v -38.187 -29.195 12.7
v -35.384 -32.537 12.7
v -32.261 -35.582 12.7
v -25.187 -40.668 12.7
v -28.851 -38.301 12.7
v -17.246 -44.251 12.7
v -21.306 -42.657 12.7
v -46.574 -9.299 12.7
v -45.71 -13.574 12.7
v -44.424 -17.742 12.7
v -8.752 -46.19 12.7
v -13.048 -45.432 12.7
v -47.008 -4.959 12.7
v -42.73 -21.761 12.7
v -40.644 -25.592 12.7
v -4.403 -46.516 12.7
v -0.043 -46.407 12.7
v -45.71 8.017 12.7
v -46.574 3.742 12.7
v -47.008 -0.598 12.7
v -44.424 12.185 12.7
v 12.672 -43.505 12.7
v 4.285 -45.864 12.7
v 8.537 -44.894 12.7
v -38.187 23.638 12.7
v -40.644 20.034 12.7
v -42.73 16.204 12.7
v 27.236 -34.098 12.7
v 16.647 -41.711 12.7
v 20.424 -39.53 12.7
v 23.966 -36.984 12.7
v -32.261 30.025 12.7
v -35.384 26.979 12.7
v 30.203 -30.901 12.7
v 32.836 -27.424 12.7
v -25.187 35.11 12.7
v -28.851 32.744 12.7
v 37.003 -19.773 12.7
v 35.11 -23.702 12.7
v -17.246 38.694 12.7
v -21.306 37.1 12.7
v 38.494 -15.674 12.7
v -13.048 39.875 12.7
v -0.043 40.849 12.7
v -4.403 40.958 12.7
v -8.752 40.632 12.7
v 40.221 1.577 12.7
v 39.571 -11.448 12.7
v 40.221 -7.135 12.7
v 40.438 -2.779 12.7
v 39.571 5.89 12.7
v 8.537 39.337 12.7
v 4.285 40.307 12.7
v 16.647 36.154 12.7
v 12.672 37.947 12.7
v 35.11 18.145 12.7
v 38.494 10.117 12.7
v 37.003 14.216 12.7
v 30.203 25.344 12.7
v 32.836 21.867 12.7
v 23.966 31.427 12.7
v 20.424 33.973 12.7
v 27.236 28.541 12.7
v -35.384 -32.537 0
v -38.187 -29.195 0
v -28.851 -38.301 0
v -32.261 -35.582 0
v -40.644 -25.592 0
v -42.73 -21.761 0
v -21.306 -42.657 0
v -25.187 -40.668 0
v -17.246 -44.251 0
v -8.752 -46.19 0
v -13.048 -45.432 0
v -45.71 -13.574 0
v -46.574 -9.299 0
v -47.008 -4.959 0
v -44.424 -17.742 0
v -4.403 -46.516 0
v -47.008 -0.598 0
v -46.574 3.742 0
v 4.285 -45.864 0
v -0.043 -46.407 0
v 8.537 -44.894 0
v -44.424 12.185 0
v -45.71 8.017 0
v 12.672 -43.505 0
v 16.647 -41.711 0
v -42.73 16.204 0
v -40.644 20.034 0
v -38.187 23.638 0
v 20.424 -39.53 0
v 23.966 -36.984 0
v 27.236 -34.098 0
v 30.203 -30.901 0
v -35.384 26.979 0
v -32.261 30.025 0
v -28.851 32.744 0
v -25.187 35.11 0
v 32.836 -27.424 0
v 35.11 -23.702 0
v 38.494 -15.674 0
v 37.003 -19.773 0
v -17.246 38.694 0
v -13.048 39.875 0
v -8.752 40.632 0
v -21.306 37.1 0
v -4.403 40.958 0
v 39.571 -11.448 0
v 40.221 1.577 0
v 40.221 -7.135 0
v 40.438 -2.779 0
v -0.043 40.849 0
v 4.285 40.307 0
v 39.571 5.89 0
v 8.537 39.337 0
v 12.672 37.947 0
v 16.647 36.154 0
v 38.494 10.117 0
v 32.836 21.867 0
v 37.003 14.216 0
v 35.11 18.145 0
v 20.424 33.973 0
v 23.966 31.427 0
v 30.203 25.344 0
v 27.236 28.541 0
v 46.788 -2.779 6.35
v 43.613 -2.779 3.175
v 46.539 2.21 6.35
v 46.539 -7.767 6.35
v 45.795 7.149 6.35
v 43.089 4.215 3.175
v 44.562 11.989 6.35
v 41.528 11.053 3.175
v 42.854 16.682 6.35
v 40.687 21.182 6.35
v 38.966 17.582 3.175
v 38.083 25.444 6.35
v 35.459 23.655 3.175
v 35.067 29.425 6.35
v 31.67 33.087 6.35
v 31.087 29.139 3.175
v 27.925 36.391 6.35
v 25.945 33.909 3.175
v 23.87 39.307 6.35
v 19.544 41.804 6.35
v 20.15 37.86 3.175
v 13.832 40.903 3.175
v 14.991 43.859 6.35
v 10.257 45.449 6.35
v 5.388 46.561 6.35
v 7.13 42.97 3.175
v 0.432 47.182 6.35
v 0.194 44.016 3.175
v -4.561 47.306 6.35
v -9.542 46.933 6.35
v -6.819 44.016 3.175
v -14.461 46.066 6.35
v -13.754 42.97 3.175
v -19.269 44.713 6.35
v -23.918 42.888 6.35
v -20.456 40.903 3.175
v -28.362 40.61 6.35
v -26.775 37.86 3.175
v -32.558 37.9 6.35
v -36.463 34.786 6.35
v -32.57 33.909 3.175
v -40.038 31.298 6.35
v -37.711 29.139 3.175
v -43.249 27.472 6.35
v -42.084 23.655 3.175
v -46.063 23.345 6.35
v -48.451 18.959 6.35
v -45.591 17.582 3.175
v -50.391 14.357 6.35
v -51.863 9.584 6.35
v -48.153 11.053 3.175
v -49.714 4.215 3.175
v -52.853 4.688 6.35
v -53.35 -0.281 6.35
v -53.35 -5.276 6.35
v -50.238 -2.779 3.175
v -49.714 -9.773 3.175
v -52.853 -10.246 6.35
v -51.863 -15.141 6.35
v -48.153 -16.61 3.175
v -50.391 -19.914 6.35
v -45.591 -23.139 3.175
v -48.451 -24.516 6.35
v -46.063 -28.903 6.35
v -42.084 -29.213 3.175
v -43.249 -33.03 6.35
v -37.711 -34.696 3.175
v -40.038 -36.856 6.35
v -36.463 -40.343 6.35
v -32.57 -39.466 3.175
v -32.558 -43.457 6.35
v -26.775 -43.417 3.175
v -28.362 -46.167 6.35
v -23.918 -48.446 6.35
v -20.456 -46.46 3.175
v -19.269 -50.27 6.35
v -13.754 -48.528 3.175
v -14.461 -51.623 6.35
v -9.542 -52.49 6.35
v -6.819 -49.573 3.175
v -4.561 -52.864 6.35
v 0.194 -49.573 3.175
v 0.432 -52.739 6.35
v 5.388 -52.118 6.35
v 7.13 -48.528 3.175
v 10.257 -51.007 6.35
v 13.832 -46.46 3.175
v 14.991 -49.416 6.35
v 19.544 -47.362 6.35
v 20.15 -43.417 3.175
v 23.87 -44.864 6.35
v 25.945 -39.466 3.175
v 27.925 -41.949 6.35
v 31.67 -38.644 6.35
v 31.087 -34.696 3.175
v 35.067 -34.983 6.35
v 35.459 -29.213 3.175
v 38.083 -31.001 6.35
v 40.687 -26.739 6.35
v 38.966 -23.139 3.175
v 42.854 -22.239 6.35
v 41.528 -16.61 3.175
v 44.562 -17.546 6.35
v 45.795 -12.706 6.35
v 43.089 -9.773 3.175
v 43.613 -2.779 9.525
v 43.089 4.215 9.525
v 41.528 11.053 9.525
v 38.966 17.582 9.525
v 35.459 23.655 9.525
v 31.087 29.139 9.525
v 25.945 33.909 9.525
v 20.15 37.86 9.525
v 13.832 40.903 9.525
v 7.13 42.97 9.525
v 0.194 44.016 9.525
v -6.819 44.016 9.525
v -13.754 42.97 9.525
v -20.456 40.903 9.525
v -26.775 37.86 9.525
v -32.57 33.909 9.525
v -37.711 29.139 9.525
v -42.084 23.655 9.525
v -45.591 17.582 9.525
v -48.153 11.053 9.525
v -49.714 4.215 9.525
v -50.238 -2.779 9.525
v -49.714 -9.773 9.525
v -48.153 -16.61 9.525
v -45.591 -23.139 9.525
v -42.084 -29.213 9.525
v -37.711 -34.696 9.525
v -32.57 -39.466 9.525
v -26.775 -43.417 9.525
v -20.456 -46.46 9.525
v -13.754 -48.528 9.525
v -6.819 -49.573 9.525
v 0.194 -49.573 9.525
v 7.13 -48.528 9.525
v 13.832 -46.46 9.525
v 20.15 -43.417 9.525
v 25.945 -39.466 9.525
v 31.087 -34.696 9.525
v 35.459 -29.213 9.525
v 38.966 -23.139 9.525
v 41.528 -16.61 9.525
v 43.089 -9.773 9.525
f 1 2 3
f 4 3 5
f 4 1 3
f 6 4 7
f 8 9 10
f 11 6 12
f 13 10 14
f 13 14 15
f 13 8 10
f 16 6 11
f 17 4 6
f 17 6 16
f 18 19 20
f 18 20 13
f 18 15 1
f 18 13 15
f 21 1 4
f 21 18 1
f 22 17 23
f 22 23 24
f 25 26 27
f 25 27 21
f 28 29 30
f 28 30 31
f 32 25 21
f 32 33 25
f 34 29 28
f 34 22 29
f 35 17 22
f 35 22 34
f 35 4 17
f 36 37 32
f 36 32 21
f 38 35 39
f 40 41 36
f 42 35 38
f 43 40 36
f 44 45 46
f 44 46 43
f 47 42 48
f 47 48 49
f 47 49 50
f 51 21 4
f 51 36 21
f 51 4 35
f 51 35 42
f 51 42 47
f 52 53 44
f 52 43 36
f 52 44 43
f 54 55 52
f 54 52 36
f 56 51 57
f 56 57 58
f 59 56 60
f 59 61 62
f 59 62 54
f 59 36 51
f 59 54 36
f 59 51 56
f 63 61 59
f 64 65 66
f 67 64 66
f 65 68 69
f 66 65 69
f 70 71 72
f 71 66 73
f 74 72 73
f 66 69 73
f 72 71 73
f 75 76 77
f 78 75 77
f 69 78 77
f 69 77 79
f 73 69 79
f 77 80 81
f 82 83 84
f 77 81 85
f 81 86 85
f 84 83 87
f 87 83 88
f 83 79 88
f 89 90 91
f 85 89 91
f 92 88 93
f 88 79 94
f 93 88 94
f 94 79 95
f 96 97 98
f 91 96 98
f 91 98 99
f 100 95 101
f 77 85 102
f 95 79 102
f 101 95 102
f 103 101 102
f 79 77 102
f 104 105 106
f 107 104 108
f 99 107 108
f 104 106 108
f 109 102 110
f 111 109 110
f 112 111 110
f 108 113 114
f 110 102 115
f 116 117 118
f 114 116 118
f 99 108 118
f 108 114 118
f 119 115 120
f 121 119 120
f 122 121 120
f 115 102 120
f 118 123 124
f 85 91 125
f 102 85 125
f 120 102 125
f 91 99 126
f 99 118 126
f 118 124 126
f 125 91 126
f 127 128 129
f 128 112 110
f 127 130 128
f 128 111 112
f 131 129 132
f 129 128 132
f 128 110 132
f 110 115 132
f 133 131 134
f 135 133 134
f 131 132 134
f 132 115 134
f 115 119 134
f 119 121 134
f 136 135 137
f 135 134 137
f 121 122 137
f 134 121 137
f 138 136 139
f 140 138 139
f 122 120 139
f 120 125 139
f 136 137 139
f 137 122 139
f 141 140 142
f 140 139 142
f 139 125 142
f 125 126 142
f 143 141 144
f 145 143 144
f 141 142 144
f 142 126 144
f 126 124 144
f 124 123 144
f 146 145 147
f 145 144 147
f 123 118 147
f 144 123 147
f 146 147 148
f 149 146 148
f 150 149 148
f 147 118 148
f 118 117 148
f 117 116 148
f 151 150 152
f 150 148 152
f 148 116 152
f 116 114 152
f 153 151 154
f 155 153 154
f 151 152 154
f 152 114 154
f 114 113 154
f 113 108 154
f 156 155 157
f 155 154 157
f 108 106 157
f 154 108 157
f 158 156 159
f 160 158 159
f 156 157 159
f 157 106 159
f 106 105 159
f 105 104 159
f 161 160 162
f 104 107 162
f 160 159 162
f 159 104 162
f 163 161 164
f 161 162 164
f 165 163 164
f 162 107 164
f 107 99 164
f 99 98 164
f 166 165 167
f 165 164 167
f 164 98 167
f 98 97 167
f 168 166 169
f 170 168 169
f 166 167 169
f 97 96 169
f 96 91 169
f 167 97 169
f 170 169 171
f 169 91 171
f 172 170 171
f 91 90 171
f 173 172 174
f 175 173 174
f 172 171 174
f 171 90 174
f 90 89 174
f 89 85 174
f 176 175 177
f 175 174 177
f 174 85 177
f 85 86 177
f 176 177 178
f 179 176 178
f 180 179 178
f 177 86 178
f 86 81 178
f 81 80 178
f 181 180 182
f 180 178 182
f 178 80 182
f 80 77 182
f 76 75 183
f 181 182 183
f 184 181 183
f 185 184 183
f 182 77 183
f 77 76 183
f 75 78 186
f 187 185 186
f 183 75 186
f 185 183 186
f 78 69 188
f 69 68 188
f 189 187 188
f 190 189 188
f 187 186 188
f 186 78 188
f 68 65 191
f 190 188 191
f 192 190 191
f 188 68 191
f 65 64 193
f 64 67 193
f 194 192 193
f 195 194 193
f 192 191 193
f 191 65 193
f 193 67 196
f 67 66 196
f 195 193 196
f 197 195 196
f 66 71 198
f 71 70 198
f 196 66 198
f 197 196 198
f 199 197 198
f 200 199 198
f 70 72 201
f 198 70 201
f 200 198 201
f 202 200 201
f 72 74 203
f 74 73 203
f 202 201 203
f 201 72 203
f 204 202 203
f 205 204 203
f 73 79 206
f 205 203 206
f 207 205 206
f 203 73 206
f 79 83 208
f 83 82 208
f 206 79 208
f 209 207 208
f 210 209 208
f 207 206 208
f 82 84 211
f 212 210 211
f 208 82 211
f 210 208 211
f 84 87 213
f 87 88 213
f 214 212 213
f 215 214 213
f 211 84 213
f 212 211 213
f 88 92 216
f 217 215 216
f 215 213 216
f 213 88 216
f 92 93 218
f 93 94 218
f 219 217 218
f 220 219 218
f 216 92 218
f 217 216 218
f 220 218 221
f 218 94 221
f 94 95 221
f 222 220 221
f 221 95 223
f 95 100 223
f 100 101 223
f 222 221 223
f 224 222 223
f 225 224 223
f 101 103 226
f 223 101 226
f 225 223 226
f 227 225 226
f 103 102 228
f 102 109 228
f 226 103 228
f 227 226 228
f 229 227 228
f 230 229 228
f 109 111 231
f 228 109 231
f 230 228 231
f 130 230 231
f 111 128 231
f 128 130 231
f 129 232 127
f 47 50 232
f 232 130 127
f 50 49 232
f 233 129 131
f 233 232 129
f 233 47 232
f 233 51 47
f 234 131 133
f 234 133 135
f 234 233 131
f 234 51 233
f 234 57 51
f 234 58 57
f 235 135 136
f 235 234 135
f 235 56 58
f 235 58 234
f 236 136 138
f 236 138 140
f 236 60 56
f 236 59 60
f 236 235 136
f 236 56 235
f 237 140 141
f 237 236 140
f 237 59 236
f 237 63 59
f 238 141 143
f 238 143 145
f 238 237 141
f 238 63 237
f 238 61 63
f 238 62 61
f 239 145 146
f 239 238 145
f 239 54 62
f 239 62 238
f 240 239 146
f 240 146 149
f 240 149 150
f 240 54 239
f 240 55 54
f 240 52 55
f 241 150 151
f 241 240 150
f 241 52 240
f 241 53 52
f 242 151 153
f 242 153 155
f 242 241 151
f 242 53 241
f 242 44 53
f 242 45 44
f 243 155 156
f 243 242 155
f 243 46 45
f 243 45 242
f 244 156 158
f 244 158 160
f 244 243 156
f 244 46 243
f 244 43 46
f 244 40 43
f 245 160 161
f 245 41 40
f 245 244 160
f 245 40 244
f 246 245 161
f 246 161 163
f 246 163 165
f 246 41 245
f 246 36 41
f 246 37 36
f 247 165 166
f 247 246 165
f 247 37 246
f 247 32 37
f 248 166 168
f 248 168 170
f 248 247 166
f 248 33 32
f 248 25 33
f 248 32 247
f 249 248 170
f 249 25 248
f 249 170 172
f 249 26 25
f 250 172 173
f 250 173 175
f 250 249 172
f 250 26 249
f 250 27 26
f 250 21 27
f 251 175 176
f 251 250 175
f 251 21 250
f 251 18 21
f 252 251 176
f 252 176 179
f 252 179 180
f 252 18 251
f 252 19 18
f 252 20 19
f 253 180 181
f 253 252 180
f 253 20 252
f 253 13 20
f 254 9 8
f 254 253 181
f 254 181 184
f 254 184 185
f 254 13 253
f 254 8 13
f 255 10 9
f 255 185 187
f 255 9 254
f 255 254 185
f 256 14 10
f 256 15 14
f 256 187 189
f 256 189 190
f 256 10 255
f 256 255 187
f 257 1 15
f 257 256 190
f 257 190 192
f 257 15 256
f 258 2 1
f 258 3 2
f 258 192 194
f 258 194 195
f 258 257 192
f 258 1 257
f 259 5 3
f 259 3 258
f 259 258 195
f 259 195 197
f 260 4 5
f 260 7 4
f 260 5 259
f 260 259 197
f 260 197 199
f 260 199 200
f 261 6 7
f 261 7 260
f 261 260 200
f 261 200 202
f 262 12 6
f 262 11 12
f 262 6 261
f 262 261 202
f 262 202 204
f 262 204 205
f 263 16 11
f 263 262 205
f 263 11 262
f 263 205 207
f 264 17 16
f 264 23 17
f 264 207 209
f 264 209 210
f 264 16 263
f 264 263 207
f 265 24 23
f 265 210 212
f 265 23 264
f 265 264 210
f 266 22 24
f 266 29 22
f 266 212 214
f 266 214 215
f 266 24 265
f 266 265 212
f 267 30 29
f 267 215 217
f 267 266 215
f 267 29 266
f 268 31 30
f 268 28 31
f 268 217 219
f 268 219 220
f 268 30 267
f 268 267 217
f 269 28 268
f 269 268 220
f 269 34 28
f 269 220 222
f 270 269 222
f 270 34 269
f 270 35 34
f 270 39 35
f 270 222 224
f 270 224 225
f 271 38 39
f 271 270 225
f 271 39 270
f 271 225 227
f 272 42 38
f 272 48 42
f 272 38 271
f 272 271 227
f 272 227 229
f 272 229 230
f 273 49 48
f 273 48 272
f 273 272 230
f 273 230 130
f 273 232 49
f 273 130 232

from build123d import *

# Parameters (mm, degrees)
F0_R     = 50.1004496622
F1_DEPTH = 12.7
F2_SIZE  = 6.35
F3_SIZE  = 6.34999


# Not quite as in the source:
# - a fillet or chamfer is up to 0.001 mm smaller than in the source, because OpenCascade refuses the exact size


with BuildPart() as f1:
    # F0 (on Top) → F1 (new body)
    with BuildSketch(Plane.XY):
        with Locations((-3.3122645349, -2.7786610853)):
            Circle(F0_R)
    extrude(amount=F1_DEPTH)

    # F2
    f2_edges = [f1.edges().sort_by_distance(p)[0] for p in [
        (-53.412714, -2.778661, 12.7),
    ]]
    chamfer(f2_edges, length=F2_SIZE)

    # F3 (size 6.35 in the source; OpenCascade refuses exactly that, so slightly less here)
    f3_edges = [f1.edges().sort_by_distance(p)[0] for p in [
        (-53.412714, -2.778661, 0),
    ]]
    chamfer(f3_edges, length=F3_SIZE)


solid = f1.part
